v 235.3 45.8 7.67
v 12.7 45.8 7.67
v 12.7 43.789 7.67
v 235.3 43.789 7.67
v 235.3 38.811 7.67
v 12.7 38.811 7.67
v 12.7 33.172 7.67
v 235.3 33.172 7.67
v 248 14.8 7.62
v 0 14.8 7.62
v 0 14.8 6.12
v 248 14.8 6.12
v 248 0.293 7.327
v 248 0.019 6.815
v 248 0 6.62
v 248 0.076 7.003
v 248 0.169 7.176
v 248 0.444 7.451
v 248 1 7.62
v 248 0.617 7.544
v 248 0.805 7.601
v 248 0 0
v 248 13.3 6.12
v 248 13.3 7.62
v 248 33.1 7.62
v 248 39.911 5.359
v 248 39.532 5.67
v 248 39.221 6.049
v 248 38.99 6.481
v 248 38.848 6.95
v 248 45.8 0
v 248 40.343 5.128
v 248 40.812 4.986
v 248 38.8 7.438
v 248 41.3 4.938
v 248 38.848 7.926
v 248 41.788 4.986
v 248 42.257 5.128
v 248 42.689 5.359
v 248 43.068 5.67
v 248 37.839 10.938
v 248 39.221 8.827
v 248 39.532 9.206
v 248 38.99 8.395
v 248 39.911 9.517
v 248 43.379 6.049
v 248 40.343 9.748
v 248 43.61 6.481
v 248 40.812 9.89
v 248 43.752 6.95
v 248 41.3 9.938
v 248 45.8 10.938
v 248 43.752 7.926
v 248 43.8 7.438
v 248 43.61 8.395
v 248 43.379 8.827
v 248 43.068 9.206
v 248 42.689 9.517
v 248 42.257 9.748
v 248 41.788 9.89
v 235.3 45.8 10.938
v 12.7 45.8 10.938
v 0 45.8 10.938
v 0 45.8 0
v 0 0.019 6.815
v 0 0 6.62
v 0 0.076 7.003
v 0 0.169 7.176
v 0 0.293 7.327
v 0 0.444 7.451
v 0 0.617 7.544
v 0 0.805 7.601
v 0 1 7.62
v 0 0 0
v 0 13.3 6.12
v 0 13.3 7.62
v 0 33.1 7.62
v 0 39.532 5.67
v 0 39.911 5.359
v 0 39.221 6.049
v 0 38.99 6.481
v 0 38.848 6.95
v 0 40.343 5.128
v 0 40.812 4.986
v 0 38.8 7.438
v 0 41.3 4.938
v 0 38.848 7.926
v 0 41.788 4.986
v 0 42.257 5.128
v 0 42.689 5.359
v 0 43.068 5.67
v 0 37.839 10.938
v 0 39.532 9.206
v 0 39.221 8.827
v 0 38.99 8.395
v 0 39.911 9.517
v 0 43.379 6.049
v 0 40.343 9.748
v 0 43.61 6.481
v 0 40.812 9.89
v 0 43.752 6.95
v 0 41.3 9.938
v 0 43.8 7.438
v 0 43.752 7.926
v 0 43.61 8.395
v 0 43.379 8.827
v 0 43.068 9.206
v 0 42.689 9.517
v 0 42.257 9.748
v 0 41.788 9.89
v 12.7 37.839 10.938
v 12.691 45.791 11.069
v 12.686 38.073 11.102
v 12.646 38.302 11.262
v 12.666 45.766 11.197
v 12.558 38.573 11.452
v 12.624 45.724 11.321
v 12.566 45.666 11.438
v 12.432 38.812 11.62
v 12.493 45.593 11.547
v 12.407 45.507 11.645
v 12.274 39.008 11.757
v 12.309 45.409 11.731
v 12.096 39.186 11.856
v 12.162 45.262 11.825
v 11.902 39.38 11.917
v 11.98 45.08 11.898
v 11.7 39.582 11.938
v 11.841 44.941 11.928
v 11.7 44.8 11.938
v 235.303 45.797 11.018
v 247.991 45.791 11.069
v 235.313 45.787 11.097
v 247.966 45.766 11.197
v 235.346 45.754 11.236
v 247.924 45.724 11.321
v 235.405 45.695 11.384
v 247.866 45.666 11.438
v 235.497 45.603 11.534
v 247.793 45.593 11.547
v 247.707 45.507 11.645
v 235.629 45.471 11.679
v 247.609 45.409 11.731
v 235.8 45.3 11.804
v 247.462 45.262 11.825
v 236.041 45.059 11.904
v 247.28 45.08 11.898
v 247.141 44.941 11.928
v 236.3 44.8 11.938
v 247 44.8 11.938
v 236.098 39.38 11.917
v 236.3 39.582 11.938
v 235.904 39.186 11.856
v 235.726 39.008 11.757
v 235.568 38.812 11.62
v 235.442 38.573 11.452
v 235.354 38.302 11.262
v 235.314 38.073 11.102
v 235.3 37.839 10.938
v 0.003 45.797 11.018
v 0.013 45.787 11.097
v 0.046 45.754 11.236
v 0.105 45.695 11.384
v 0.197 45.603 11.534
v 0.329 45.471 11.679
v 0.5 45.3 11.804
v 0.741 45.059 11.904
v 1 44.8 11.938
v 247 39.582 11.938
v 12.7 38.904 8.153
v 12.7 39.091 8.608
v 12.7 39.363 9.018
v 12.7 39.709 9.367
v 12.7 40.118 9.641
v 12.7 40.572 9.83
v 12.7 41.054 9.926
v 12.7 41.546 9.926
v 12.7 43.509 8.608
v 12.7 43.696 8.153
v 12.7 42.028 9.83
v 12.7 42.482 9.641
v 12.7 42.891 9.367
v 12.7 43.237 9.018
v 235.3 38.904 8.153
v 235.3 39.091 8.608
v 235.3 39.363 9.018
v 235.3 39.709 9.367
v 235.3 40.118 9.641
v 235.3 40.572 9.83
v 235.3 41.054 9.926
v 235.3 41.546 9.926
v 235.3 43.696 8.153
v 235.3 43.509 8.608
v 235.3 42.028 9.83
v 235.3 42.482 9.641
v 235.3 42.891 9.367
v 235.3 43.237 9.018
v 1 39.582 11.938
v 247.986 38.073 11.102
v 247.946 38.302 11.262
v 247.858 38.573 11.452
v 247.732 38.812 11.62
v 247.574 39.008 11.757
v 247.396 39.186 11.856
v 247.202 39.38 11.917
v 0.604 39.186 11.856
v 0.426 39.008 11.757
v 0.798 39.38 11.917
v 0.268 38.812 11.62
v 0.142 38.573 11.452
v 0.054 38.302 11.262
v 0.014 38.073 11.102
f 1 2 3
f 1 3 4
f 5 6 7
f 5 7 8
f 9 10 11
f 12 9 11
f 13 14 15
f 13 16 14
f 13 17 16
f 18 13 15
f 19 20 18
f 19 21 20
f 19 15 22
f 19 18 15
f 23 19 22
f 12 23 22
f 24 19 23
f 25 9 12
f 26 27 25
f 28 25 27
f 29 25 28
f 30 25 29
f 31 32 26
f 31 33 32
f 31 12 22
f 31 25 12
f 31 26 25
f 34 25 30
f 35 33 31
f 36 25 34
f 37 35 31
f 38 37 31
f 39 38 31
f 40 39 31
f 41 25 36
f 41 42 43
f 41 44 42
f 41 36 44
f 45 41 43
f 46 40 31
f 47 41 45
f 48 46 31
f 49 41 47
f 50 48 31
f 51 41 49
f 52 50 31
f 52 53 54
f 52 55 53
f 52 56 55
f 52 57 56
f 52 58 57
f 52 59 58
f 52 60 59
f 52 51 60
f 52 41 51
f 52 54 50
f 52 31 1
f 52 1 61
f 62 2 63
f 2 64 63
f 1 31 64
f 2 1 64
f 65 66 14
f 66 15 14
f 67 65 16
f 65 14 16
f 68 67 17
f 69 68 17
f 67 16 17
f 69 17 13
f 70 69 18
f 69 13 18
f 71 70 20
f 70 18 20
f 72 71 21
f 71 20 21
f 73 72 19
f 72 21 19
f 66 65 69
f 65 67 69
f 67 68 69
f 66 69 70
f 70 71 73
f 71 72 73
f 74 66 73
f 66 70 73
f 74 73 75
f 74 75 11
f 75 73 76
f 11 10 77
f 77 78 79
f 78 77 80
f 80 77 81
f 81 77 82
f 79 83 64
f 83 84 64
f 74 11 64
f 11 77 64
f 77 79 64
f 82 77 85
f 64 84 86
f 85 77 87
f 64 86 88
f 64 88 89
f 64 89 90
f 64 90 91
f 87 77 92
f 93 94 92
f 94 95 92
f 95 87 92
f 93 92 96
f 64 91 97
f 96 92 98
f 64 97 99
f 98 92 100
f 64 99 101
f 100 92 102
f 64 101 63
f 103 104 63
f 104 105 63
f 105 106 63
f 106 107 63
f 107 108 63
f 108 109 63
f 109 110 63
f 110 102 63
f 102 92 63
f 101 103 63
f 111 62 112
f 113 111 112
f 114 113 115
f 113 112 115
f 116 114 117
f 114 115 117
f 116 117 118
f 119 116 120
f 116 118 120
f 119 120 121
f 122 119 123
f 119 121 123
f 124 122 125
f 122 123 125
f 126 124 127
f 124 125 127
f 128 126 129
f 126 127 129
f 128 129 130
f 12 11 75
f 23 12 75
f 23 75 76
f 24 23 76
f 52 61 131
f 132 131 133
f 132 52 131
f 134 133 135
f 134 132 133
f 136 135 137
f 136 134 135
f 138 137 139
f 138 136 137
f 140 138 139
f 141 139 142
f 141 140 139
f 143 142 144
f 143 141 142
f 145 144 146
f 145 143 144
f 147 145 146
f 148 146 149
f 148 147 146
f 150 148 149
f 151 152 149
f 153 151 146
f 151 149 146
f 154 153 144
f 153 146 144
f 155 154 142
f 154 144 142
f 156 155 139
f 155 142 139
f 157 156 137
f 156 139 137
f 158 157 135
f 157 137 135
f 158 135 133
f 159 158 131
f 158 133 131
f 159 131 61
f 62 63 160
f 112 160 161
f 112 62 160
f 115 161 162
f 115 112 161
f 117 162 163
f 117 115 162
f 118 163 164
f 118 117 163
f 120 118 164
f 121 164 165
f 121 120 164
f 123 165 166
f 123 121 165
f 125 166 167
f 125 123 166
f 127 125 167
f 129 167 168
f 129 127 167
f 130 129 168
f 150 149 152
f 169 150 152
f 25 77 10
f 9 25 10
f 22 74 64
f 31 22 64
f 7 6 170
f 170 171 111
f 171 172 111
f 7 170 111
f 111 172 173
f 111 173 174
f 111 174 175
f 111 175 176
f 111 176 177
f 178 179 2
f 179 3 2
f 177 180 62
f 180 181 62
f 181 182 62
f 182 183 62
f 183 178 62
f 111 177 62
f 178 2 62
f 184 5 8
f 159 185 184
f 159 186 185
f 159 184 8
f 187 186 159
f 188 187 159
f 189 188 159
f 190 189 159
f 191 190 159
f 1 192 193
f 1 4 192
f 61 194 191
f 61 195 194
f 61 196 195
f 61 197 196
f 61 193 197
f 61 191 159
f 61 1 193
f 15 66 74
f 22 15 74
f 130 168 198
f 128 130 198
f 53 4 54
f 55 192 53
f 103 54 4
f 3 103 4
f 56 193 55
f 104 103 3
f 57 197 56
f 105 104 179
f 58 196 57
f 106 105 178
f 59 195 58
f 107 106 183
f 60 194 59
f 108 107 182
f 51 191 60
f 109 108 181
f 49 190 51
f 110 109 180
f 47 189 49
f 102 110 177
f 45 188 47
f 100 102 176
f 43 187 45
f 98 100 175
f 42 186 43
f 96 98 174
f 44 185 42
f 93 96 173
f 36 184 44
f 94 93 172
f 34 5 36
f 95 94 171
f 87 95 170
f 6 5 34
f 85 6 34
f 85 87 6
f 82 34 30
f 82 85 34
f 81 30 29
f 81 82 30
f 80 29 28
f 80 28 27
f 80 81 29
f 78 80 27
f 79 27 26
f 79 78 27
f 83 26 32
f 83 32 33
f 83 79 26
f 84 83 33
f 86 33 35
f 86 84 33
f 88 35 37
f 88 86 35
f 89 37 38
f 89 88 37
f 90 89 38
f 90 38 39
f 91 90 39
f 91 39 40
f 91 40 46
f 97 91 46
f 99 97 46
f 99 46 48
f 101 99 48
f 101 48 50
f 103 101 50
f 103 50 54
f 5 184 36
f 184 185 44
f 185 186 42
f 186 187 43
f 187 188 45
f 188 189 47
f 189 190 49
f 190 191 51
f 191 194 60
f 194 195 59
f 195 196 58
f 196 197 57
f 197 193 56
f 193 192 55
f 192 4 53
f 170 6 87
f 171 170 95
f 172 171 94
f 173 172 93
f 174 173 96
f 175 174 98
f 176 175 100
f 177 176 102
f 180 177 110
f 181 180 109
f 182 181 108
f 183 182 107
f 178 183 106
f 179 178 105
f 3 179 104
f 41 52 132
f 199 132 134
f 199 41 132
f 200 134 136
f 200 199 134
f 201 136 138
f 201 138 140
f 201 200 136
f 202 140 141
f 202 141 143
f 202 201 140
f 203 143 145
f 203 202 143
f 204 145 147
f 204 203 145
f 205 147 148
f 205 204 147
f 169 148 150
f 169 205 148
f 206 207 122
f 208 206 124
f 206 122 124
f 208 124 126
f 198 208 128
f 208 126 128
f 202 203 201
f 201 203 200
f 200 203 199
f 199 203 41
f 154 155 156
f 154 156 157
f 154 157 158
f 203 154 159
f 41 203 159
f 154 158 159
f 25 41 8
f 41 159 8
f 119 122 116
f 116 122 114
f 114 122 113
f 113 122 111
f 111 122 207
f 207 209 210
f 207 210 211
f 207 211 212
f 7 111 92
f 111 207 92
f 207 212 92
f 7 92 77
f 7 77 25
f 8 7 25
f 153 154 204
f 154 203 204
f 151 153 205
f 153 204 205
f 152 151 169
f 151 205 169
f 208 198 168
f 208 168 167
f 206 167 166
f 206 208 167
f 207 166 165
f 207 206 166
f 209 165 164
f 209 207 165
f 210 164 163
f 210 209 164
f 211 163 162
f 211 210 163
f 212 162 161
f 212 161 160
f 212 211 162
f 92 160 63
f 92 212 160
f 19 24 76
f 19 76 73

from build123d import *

# Parameters (mm, degrees)
SKETCH_R     = 2.5
PAD_DEPTH    = 248
SKETCH001_W  = 4.639466
SKETCH001_H  = 222.6
POCKET_DEPTH = 25.4
FILLET_R     = 1
FILLET001_R  = 1
FILLET002_R  = 1


with BuildPart() as part:
    # Sketch → Pad (new body)
    with BuildSketch(Plane.YZ):
        Polygon((0, 0), (45.8, 0), (45.8, 7.62), (45.8, 11.938), (39.266743, 11.938), (33.1, 7.62), (14.8, 7.62), (14.8, 6.12), (13.3, 6.12), (13.3, 7.62), (0, 7.62), align=None)
        with Locations((41.3, 7.438)):
            Circle(SKETCH_R, mode=Mode.SUBTRACT)
    extrude(amount=PAD_DEPTH)

    # Sketch001 (on Face3 of Pad) → Pocket (cut)
    with BuildSketch(Plane.ZX.offset(45.8)):
        with Locations((9.990006, 124)):
            Rectangle(SKETCH001_W, SKETCH001_H)
    extrude(amount=-POCKET_DEPTH, mode=Mode.SUBTRACT)

    # Fillet
    fillet_edges = [part.edges().sort_by_distance(p)[0] for p in [
        (124, 0, 7.62),
    ]]
    fillet(fillet_edges, radius=FILLET_R)

    # Fillet001
    fillet001_edges = [part.edges().sort_by_distance(p)[0] for p in [
        (235.3, 42.533372, 11.938),
        (241.65, 39.266743, 11.938),
        (248, 42.533372, 11.938),
        (241.65, 45.8, 11.938),
    ]]
    fillet(fillet001_edges, radius=FILLET001_R)

    # Fillet002
    fillet002_edges = [part.edges().sort_by_distance(p)[0] for p in [
        (0, 42.533372, 11.938),
        (6.35, 39.266743, 11.938),
        (12.7, 42.533372, 11.938),
        (6.35, 45.8, 11.938),
    ]]
    fillet(fillet002_edges, radius=FILLET002_R)


solid = part.part
